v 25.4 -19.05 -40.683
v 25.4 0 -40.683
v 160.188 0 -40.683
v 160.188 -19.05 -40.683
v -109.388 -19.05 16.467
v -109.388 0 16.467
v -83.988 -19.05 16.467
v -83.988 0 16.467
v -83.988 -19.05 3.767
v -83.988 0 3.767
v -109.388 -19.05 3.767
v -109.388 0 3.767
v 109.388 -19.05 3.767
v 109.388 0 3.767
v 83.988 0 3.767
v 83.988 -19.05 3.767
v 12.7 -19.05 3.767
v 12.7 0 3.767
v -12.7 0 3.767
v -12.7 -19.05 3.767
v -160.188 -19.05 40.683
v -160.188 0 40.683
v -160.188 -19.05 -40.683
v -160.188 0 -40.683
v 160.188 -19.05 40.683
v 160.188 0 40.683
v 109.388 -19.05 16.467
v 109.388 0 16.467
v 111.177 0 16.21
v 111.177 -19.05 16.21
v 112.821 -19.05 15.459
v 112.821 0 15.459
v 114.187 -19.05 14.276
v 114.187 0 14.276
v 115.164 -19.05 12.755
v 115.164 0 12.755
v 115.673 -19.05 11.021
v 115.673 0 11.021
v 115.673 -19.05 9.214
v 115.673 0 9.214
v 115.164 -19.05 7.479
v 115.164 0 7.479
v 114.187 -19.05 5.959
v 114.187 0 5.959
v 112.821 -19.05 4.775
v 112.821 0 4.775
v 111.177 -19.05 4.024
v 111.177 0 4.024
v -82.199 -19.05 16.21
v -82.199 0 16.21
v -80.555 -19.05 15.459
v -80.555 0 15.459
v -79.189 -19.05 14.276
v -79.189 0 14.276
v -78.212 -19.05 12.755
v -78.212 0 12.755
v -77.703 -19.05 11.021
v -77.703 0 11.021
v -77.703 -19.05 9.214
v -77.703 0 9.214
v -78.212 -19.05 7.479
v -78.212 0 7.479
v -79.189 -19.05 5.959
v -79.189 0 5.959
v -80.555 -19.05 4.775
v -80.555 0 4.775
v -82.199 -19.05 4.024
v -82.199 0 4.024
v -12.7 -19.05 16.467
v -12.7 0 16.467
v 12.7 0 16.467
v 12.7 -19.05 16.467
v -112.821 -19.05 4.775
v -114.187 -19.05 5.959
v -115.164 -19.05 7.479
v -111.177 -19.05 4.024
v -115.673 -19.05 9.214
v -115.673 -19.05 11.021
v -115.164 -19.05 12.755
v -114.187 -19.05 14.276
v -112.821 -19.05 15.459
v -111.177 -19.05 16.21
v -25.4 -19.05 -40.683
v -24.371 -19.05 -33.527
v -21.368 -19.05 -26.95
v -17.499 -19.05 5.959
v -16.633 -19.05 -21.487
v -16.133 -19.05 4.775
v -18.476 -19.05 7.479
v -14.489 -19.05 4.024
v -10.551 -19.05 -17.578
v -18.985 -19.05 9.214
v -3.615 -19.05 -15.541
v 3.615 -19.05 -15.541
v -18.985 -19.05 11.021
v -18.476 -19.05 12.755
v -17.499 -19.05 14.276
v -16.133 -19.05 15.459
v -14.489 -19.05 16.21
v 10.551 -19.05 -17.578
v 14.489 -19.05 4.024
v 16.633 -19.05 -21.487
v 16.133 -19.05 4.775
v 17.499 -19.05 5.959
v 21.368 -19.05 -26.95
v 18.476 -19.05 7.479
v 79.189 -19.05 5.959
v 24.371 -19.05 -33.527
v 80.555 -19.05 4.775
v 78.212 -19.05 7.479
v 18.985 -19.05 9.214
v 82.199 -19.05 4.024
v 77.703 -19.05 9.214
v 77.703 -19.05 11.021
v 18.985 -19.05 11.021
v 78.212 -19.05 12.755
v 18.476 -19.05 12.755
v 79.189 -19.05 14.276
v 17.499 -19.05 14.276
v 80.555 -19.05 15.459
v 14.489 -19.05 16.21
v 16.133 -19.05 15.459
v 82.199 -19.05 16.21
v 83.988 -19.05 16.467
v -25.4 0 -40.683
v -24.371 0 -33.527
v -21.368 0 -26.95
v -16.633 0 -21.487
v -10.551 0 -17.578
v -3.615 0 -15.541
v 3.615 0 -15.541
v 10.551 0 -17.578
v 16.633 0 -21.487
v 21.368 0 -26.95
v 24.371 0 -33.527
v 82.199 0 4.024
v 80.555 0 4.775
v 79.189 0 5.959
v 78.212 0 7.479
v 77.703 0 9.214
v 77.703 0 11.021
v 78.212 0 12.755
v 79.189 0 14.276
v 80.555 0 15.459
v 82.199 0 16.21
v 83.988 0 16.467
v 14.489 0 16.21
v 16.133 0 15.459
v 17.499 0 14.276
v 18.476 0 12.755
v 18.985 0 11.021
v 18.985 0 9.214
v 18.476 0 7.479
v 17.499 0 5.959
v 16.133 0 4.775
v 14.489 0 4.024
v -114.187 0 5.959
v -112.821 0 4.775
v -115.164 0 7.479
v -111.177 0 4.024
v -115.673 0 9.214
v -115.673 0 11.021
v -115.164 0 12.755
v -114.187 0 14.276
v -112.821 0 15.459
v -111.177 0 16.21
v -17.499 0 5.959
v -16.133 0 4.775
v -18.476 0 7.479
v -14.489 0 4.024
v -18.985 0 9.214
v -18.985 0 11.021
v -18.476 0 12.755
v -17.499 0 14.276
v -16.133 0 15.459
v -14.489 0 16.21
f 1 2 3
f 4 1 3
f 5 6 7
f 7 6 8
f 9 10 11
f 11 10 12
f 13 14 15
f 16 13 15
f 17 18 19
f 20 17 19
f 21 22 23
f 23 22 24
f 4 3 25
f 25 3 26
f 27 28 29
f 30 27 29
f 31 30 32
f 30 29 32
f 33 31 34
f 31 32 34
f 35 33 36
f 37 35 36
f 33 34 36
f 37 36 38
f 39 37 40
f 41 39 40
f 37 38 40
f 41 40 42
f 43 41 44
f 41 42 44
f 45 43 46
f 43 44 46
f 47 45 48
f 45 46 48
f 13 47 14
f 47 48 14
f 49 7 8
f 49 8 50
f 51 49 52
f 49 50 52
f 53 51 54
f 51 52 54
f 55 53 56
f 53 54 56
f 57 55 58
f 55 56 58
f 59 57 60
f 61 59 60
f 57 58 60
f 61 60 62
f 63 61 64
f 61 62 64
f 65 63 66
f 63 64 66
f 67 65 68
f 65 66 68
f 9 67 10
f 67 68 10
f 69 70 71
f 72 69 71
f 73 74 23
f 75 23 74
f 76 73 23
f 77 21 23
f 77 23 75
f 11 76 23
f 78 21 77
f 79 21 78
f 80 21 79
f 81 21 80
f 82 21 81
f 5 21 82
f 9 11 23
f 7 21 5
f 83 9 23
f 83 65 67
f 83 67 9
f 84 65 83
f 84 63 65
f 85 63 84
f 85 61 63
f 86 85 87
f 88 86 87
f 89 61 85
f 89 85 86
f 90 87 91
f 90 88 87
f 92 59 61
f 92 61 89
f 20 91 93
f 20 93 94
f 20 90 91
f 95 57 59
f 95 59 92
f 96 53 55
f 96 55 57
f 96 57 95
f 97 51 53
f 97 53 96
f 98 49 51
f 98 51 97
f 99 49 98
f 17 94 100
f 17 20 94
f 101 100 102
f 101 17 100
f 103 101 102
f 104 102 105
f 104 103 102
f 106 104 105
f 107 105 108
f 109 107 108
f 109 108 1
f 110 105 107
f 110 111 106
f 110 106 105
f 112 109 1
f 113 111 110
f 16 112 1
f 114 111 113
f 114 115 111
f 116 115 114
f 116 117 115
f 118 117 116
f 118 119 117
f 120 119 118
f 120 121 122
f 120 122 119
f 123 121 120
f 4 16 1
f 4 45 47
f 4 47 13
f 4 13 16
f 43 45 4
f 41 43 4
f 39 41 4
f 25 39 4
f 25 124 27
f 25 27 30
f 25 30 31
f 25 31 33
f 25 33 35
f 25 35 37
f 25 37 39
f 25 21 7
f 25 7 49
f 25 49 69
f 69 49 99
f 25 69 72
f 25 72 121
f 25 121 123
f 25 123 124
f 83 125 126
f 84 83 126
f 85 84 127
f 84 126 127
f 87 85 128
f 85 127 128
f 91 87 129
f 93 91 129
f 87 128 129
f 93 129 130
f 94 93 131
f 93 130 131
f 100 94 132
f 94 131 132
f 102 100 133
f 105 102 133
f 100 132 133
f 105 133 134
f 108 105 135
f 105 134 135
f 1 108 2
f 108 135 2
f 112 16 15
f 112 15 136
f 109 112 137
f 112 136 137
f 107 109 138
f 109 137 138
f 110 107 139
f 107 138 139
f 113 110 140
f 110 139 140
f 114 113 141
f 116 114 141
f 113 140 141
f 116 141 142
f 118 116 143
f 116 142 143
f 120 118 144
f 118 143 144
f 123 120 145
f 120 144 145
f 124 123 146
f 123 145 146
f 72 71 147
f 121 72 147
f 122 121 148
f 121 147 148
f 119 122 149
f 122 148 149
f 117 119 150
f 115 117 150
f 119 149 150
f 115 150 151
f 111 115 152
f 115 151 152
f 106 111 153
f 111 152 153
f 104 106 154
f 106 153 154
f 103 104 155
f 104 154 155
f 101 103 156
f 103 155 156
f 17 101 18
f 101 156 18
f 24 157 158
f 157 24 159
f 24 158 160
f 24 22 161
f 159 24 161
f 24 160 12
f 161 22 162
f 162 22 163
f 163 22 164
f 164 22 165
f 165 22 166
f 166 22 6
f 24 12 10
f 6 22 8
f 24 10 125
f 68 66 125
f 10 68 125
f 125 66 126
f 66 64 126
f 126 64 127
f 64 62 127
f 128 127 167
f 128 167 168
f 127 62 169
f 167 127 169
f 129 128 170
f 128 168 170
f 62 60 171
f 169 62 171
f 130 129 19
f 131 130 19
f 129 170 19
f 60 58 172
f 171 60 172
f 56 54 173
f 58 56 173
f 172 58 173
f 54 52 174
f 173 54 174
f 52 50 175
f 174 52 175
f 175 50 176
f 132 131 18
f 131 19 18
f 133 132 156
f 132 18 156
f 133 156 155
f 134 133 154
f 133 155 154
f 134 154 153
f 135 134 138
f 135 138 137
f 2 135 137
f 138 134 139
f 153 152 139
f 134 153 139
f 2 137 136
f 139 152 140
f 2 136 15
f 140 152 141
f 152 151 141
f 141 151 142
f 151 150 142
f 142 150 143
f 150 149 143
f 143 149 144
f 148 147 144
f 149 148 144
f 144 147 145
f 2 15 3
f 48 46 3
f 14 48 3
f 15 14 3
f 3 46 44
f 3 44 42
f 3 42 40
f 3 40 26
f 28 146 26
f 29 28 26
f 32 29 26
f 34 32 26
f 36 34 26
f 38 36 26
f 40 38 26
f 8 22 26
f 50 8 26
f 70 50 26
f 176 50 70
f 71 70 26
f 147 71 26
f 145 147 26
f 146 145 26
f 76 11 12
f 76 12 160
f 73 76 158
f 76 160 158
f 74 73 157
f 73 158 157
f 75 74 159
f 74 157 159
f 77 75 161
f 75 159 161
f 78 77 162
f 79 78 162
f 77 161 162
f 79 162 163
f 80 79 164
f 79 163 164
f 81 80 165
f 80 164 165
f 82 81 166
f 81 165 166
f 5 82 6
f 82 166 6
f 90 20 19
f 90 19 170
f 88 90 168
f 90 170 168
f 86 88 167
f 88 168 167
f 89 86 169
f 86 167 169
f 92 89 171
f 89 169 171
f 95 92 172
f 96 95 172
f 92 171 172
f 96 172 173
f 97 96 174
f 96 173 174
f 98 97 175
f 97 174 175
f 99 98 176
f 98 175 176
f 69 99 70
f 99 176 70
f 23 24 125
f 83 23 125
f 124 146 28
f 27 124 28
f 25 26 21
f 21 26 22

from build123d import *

# Parameters (mm, degrees)
F1_DEPTH = 19.05


with BuildPart() as f1:
    # F0 (on Front) → F1 (new body)
    with BuildSketch(Plane.XZ):
        with BuildLine():
            Line((-160.187716, -40.682596), (-25.399898, -40.682596))
            ThreePointArc((-25.399898, -40.682596), (0, -15.282697), (25.399898, -40.682596))
            Line((25.399898, -40.682596), (160.187742, -40.682596))
            Line((160.187742, -40.682596), (160.187742, 40.682596))
            Line((160.187742, 40.682596), (-160.187716, 40.682596))
            Line((-160.187716, 40.682596), (-160.187716, -40.682596))
        make_face()
        with BuildLine():
            ThreePointArc((-109.387919, 3.767226), (-115.737894, 10.117201), (-109.387919, 16.467176))
            Line((-109.387919, 16.467176), (-83.988021, 16.467176))
            ThreePointArc((-83.988021, 16.467176), (-77.638046, 10.117201), (-83.988021, 3.767226))
            Line((-83.988021, 3.767226), (-109.387919, 3.767226))
        make_face(mode=Mode.SUBTRACT)
        with BuildLine():
            ThreePointArc((-12.699949, 3.767226), (-19.049924, 10.117201), (-12.699949, 16.467176))
            Line((-12.699949, 16.467176), (12.699949, 16.467176))
            ThreePointArc((12.699949, 16.467176), (19.049924, 10.117201), (12.699949, 3.767226))
            Line((12.699949, 3.767226), (-12.699949, 3.767226))
        make_face(mode=Mode.SUBTRACT)
        with BuildLine():
            ThreePointArc((109.387945, 16.467176), (115.737919, 10.117201), (109.387945, 3.767226))
            Line((109.387945, 3.767226), (83.988021, 3.767226))
            ThreePointArc((83.988021, 3.767226), (77.638046, 10.117201), (83.988021, 16.467176))
            Line((83.988021, 16.467176), (109.387945, 16.467176))
        make_face(mode=Mode.SUBTRACT)
    extrude(amount=F1_DEPTH)


solid = f1.part
